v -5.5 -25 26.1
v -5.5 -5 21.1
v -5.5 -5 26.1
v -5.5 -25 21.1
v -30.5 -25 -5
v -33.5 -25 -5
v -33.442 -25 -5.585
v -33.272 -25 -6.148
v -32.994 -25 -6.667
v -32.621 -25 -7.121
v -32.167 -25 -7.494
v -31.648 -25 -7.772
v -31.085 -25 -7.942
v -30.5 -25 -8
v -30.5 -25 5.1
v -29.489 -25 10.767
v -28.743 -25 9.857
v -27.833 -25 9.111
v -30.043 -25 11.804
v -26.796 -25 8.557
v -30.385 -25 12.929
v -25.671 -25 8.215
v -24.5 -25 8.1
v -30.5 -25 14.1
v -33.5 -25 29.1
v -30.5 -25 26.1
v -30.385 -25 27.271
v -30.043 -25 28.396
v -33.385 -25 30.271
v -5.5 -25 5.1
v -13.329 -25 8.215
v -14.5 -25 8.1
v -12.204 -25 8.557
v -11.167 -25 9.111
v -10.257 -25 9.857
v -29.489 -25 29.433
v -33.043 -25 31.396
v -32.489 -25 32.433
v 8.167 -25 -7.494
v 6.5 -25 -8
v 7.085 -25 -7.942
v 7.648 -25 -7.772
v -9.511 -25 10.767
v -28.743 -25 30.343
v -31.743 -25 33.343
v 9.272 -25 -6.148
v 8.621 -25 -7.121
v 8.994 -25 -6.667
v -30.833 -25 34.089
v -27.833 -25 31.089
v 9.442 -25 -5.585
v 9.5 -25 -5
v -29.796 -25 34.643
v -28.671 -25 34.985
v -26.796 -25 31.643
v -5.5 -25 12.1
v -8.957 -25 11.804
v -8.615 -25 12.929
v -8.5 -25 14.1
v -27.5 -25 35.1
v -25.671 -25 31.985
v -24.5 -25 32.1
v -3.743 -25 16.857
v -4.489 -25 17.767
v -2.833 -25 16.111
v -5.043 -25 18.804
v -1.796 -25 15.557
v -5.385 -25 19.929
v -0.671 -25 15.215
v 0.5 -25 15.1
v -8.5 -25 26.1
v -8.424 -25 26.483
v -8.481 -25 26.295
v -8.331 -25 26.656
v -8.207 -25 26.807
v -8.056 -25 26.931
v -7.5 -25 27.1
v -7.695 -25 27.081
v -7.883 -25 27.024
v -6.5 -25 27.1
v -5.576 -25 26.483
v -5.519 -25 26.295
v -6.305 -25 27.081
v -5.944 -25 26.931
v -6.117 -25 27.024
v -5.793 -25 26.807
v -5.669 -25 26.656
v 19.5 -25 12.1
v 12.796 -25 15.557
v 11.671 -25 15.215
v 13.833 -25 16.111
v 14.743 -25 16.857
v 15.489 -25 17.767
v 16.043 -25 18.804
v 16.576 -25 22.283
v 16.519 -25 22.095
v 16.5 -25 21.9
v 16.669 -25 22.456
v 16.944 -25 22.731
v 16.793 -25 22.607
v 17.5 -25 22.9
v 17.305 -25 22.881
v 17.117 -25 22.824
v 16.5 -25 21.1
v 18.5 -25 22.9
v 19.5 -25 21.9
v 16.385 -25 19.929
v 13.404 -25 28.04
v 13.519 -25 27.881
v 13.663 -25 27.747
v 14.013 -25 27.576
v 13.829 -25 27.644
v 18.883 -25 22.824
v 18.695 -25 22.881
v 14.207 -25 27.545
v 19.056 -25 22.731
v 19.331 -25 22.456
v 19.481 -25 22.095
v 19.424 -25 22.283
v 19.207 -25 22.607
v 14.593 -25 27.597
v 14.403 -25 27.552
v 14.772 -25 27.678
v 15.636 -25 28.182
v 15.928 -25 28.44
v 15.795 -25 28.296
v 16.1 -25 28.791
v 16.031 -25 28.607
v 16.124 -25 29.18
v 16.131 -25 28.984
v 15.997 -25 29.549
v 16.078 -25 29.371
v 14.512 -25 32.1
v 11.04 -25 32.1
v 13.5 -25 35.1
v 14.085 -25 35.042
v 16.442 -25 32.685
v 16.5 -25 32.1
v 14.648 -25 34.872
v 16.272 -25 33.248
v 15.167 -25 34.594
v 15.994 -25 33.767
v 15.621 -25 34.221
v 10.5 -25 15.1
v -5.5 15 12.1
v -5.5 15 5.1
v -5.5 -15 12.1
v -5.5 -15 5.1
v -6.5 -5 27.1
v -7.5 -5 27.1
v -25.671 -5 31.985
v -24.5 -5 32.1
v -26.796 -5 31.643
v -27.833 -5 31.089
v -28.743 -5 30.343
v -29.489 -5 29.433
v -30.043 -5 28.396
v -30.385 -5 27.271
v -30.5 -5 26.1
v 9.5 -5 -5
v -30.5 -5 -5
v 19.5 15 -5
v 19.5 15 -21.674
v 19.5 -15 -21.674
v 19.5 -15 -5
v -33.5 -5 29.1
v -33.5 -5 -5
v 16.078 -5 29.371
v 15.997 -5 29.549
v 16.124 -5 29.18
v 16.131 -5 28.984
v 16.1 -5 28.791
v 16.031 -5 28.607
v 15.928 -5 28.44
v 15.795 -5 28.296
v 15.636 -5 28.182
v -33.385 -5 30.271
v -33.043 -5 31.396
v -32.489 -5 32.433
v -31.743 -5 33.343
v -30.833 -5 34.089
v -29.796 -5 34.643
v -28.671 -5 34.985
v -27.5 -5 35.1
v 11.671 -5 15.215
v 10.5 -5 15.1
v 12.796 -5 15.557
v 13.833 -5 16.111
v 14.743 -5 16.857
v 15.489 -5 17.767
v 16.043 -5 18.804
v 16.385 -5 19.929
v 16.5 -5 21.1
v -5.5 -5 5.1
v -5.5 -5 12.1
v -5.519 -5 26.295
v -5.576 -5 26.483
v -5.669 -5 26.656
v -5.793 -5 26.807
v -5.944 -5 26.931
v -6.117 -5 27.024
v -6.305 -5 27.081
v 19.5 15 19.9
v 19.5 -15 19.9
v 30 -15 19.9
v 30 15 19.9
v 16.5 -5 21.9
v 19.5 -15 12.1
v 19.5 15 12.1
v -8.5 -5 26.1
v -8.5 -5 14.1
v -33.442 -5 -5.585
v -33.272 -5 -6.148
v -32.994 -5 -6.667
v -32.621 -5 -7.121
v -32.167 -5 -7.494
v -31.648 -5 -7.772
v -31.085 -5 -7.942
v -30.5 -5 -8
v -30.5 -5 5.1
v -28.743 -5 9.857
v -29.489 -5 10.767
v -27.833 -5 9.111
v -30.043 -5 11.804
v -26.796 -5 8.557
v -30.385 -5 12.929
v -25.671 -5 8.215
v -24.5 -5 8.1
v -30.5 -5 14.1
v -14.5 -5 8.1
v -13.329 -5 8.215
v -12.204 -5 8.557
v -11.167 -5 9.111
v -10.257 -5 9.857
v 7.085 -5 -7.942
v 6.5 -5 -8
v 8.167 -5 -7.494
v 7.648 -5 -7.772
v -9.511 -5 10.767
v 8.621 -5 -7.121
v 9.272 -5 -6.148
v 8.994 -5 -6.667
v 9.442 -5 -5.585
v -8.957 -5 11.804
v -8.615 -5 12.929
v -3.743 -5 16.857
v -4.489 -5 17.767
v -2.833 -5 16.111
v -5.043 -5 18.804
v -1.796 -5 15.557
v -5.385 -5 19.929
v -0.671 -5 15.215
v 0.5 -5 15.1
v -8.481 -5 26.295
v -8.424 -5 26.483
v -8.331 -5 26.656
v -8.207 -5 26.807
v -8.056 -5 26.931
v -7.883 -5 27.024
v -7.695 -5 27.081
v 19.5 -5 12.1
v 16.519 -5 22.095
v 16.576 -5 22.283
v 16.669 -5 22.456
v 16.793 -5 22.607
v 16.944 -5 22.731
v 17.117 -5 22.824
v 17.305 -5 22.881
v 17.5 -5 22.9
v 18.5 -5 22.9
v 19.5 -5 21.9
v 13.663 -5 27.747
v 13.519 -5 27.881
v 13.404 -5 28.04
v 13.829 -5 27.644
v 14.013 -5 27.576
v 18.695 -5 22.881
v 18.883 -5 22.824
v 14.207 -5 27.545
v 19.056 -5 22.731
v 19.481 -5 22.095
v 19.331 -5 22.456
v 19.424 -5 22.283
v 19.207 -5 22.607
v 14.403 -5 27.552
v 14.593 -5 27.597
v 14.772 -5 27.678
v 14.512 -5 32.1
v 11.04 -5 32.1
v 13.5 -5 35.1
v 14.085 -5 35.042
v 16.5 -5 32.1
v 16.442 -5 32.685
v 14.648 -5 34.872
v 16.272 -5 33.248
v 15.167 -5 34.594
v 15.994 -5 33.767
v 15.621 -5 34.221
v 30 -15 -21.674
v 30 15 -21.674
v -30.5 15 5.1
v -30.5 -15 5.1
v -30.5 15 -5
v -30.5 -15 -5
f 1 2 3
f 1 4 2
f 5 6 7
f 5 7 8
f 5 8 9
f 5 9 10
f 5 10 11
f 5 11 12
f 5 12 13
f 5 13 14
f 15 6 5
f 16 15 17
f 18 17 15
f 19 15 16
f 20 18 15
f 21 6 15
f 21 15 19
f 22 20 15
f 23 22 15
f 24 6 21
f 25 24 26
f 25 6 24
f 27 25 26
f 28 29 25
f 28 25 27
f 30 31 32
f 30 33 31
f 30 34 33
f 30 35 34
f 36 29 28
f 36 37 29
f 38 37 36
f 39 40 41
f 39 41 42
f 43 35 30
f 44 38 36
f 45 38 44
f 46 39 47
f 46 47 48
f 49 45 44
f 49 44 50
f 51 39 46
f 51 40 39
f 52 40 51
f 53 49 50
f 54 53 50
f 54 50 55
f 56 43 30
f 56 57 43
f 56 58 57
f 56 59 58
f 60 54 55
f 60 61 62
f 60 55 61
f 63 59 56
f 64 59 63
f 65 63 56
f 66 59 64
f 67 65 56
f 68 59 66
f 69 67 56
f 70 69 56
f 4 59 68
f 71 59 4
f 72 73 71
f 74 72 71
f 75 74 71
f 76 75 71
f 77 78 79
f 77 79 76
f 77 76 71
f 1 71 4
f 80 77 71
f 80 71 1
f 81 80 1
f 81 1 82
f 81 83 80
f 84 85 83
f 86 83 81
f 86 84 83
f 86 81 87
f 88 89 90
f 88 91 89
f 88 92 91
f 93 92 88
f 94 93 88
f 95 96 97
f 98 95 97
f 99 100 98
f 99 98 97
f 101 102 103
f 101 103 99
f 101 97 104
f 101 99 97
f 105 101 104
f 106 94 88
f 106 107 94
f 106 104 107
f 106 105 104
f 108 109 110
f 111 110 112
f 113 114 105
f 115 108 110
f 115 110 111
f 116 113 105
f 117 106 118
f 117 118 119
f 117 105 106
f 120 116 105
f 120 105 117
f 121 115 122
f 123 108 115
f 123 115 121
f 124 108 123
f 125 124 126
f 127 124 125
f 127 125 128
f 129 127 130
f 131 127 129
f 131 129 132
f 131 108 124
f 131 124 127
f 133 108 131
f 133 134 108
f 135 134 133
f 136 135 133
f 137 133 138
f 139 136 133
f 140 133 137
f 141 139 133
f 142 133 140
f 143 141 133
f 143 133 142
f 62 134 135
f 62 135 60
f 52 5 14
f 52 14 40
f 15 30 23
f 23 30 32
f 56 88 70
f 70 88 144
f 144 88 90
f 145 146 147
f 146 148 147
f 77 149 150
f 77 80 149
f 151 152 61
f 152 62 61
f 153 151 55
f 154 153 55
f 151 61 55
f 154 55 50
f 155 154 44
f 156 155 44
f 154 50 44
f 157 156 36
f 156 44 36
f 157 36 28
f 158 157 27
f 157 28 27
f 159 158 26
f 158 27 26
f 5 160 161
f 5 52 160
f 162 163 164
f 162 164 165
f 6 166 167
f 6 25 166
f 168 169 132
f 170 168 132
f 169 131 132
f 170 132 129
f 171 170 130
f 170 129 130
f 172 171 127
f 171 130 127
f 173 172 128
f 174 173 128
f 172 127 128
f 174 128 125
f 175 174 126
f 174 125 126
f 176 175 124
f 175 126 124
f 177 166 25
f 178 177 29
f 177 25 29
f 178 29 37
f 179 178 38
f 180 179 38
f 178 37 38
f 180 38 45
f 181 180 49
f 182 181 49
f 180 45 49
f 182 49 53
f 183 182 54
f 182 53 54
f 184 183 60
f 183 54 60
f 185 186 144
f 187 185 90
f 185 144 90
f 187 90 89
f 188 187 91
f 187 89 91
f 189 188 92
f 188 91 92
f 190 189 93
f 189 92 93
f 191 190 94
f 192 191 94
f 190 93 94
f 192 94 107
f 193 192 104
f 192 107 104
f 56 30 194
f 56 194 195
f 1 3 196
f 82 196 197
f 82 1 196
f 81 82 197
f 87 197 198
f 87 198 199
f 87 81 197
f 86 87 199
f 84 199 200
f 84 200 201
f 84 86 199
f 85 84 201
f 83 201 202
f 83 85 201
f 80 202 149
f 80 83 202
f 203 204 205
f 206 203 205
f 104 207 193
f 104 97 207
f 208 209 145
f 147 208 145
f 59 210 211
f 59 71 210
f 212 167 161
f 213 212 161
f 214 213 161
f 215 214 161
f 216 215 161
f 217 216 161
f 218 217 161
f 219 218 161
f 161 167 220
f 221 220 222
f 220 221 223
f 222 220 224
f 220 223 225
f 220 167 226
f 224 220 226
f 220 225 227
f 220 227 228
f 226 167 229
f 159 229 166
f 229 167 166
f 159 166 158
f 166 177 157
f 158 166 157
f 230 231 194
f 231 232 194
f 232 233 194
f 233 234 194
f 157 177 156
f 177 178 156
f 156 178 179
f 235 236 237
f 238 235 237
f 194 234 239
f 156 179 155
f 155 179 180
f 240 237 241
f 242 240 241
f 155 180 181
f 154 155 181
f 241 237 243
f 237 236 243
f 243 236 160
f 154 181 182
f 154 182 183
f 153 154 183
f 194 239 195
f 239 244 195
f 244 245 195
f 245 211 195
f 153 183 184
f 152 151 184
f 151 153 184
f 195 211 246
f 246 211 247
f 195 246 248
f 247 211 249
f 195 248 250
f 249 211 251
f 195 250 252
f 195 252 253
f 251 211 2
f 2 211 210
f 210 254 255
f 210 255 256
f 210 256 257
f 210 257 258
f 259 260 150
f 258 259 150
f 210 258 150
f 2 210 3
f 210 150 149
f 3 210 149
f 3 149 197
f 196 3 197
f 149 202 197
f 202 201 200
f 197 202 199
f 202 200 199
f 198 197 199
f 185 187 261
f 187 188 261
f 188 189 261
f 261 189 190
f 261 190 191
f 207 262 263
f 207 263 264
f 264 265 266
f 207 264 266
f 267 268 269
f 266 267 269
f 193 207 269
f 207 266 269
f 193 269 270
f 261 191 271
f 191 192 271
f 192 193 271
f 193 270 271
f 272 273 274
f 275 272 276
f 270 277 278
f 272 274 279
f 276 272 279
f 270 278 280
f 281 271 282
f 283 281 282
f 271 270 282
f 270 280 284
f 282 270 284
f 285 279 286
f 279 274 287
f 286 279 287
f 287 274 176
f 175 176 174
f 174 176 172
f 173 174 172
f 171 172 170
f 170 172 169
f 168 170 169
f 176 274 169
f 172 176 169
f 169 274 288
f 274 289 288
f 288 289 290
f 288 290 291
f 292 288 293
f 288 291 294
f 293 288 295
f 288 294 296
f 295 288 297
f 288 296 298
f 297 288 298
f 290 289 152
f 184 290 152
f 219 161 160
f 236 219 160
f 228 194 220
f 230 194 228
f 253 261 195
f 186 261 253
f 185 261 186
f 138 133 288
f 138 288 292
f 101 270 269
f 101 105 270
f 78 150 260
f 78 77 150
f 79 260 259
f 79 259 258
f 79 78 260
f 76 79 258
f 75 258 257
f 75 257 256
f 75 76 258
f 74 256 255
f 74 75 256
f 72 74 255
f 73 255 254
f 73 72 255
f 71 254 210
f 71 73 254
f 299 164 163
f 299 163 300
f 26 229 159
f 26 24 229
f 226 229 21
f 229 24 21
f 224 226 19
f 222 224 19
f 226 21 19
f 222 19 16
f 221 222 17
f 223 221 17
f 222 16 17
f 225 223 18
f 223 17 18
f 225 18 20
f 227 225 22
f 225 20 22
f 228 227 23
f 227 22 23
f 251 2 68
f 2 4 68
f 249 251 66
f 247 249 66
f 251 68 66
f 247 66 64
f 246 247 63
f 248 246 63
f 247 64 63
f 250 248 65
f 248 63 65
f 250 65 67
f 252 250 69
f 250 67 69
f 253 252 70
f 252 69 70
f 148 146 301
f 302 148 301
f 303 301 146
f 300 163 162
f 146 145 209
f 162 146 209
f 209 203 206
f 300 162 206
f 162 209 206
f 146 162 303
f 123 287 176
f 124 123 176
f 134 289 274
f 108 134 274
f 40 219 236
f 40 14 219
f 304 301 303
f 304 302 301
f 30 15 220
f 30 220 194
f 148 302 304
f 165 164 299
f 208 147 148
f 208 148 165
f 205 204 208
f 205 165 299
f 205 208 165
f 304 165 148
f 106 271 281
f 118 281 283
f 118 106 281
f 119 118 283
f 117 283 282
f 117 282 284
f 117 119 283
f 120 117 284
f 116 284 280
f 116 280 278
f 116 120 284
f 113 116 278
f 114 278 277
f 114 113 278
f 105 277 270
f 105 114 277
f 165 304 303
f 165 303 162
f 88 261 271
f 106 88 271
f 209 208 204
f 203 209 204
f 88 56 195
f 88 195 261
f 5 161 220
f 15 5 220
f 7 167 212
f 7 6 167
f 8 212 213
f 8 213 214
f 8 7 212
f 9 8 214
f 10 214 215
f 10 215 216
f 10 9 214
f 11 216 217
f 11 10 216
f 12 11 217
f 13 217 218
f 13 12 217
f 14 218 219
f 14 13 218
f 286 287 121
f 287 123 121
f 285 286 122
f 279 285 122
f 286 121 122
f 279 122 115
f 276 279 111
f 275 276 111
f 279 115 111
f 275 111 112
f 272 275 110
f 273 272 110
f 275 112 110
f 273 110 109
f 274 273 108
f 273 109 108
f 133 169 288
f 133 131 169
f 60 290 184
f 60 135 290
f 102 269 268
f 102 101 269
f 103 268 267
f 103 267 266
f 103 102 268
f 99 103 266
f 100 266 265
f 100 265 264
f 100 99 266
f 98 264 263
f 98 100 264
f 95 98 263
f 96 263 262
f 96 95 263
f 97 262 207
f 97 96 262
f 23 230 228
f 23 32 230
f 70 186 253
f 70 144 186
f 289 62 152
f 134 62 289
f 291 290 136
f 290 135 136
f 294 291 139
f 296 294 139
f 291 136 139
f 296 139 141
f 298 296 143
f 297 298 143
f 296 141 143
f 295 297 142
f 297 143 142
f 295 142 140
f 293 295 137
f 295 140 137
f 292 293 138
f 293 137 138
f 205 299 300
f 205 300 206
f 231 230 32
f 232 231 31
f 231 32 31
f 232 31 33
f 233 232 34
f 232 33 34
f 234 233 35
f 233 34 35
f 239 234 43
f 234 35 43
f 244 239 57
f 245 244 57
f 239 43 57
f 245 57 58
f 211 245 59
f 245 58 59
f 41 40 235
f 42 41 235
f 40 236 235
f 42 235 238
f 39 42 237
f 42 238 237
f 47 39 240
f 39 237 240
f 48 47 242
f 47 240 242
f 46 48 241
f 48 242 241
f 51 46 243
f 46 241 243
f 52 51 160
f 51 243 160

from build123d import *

# Parameters (mm, degrees)
F0_W          = 25
F0_H          = 7
F0_W_2        = 10.5
F0_H_2        = 10.1
F0_H_3        = 16.6735936701
F0_H_4        = 7.8
F1_DEPTH      = 15
F1_DEPTH_BACK = 15
F3_DEPTH      = 10
F3_DEPTH_BACK = 10
F4_R          = 6
F5_R          = 2.99999
F6_R          = 1


# Not quite as in the source:
# - a fillet or chamfer is up to 0.001 mm smaller than in the source, because OpenCascade refuses the exact size


with BuildPart() as f1:
    # F0 (on Front) → F1 (new body, two sides)
    with BuildSketch(Plane.XZ) as f1_sk:
        Polygon((-5.5, 5.1), (-30.5, 5.1), (-30.5, -5), (19.5, -5), (19.5, 5.1), align=None)
        with Locations((7, 8.6)):
            Rectangle(F0_W, F0_H)
        with Locations((24.75, 8.6)):
            Rectangle(F0_W_2, F0_H)
        with Locations((24.75, 0.05)):
            Rectangle(F0_W_2, F0_H_2)
        with Locations((24.75, -13.3367968351)):
            Rectangle(F0_W_2, F0_H_3)
        with Locations((24.75, 16)):
            Rectangle(F0_W_2, F0_H_4)
    extrude(amount=F1_DEPTH)
    extrude(f1_sk.sketch, amount=-F1_DEPTH_BACK)


with BuildPart() as f3:
    # F2 (on face) → F3 (new body, two sides)
    with BuildSketch(Plane.XZ.offset(15)) as f3_sk:
        Polygon((-30.5, -5), (-30.5, 5.1), (-5.5, 5.1), (-5.5, 12.1), (-5.5, 15.1), (-5.5, 27.1), (-8.5, 27.1), (-8.5, 15.1), (-8.5, 8.1), (-30.5, 8.1), (-30.5, 32.1), (11.0402089751, 32.1), (14.5116200045, 32.1), (12.7649962514, 35.1), (1.8319657538, 35.1), (-33.5, 35.1), (-33.5, 8.1), (-33.5, -5), (-33.5, -8), (9.5, -8), (9.5, -5), align=None)
        Polygon((-5.5, 15.1), (-5.5, 12.1), (19.5, 12.1), (19.5, 19.9), (19.5, 22.9), (16.5, 22.9), (16.5, 15.1), align=None)
        Polygon((16.5, 35.1), (12.7649962514, 35.1), (14.5116200045, 32.1), (16.5, 32.1), align=None)
        Polygon((14.5116200045, 32.1), (11.0402089751, 32.1), (13.9073943063, 27.1753240482), (16.5, 28.6847596105), align=None)
    extrude(amount=F3_DEPTH)
    extrude(f3_sk.sketch, amount=-F3_DEPTH_BACK)

    # F4
    f4_edges = [f3.edges().sort_by_distance(p)[0] for p in [
        (-30.5, -15, 8.1),
        (-30.5, -15, 32.1),
        (-8.5, -15, 8.1),
        (16.5, -15, 15.1),
        (-33.5, -15, 35.1),
        (-5.5, -15, 15.1),
    ]]
    fillet(f4_edges, radius=F4_R)

    # F5 (radius 3 in the source; OpenCascade refuses exactly that, so slightly less here)
    f5_edges = [f3.edges().sort_by_distance(p)[0] for p in [
        (-33.5, -15, -8),
        (9.5, -15, -8),
        (16.5, -15, 35.1),
    ]]
    fillet(f5_edges, radius=F5_R)

    # F6
    f6_edges = [f3.edges().sort_by_distance(p)[0] for p in [
        (13.907394, -15, 27.175324),
        (16.5, -15, 28.68476),
        (-8.5, -15, 27.1),
        (-5.5, -15, 27.1),
        (16.5, -15, 22.9),
        (19.5, -15, 22.9),
    ]]
    fillet(f6_edges, radius=F6_R)


solid = Compound([f1.part, f3.part])
